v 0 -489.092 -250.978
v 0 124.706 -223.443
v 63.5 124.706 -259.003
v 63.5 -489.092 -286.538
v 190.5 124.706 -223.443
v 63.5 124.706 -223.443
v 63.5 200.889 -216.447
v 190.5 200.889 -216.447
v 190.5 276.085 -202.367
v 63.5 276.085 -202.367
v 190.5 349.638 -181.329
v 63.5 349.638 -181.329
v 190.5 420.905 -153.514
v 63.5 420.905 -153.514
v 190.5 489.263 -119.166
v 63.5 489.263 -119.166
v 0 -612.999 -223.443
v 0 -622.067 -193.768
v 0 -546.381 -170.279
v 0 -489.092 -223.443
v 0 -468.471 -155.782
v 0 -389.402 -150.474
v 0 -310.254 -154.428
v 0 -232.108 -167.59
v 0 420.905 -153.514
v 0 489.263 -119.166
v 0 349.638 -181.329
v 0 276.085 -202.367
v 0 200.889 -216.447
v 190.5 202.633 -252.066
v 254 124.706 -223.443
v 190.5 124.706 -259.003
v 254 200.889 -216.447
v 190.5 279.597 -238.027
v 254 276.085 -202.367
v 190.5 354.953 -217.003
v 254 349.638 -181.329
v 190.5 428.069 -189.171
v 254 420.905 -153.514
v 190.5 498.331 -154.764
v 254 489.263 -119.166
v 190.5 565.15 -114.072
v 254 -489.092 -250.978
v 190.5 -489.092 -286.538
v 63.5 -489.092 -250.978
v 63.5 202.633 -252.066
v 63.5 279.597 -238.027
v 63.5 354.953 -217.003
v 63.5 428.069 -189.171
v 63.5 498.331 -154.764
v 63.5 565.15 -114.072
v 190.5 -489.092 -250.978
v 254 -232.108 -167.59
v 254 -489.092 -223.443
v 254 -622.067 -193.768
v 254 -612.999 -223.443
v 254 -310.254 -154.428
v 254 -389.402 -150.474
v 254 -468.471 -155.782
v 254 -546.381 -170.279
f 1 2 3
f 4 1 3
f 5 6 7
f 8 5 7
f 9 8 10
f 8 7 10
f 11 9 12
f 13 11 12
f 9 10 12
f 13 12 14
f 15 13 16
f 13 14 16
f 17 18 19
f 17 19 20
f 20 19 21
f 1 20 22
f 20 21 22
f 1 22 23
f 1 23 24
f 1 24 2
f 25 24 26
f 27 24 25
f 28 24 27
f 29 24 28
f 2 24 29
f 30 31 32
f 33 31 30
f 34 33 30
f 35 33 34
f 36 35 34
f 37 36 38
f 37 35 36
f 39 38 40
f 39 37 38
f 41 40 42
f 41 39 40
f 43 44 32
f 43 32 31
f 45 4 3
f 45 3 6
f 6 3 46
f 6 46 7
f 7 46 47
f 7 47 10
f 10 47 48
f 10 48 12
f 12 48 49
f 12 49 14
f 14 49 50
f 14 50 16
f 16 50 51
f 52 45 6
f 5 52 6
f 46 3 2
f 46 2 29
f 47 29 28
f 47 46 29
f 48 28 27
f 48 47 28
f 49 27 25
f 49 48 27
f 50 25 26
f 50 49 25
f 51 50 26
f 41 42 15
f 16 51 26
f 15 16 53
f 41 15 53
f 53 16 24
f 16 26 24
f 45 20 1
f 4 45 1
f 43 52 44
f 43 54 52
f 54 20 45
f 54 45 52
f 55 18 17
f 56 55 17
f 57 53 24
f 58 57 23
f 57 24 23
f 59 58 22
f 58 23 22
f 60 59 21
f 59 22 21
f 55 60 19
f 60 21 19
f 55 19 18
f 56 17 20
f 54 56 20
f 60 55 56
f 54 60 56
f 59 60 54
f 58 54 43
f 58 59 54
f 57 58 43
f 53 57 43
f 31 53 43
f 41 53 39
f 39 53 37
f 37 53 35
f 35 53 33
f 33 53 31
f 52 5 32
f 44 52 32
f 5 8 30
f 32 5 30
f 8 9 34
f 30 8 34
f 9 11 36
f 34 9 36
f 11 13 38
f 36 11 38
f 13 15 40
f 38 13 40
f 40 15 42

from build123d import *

# Parameters (mm, degrees)
F1_DEPTH = 254
F5_DEPTH = 307.34


with BuildPart() as f1:
    # F0 (on Right) → F1 (new body)
    with BuildSketch(Plane.YZ):
        with BuildLine():
            ThreePointArc((124.7064843774, -223.4433591366), (347.4699832399, -182.0563968003), (550.3501296043, -81.1797231436))
            Line((550.3501296043, -81.1797231436), (-238.9836609364, -132.8076571226))
            ThreePointArc((-238.9836609364, -132.8076571226), (-435.8096530096, -129.9809624391), (-625.6195306778, -182.1410208941))
            Line((-625.6195306778, -182.1410208941), (-612.9993796349, -223.4433591366))
            Line((-612.9993796349, -223.4433591366), (-489.0923500061, -223.4433591366))
            Line((-489.0923500061, -223.4433591366), (-489.0923500061, -250.9782612324))
            Line((-489.0923500061, -250.9782612324), (124.7064843774, -223.4433591366))
        make_face()
    extrude(amount=F1_DEPTH)

    # F3: sweep along a path in F3_path
    with BuildLine(Plane(origin=(0, 124.7064843774, -223.4433591366), x_dir=(0, 0, -1), z_dir=(-1, 0, 0))) as f3_path:
        Line((27.5349020958, 613.7988343835), (0, 0))
        ThreePointArc((0, 0), (-41.3869623363, -222.7634988625), (-142.263635993, -425.643645227))
    # F2 (on face) → F3 (sweep)
    with BuildSketch(Plane.XZ.offset(489.0923500061)):
        Polygon((63.5, -286.5382612324), (63.5, -250.9782612324), (0, -250.9782612324), align=None)
        Polygon((254, -250.9782612324), (190.5, -250.9782612324), (190.5, -286.5382612324), align=None)
    sweep(path=f3_path.line)

    # F4 (on face) → F5 (cut)
    with BuildSketch(Plane(origin=(0, 0, 0), x_dir=(0, -1, 0), z_dir=(-1, 0, 0))):
        with BuildLine():
            Line((622.0669402345, -193.7676877722), (640.6544446945, -195.0154304504))
            Line((640.6544446945, -195.0154304504), (549.1129755974, -11.9324130937))
            Line((549.1129755974, -11.9324130937), (-511.2428665161, 10.9529634938))
            Line((-511.2428665161, 10.9529634938), (-584.1369628906, -112.79758811))
            Line((-584.1369628906, -112.79758811), (232.107648548, -167.5904861977))
            ThreePointArc((232.107648548, -167.5904861977), (429.0143567126, -151.9718221639), (622.0669402345, -193.7676877722))
        make_face()
    extrude(amount=-F5_DEPTH, mode=Mode.SUBTRACT)


solid = f1.part
